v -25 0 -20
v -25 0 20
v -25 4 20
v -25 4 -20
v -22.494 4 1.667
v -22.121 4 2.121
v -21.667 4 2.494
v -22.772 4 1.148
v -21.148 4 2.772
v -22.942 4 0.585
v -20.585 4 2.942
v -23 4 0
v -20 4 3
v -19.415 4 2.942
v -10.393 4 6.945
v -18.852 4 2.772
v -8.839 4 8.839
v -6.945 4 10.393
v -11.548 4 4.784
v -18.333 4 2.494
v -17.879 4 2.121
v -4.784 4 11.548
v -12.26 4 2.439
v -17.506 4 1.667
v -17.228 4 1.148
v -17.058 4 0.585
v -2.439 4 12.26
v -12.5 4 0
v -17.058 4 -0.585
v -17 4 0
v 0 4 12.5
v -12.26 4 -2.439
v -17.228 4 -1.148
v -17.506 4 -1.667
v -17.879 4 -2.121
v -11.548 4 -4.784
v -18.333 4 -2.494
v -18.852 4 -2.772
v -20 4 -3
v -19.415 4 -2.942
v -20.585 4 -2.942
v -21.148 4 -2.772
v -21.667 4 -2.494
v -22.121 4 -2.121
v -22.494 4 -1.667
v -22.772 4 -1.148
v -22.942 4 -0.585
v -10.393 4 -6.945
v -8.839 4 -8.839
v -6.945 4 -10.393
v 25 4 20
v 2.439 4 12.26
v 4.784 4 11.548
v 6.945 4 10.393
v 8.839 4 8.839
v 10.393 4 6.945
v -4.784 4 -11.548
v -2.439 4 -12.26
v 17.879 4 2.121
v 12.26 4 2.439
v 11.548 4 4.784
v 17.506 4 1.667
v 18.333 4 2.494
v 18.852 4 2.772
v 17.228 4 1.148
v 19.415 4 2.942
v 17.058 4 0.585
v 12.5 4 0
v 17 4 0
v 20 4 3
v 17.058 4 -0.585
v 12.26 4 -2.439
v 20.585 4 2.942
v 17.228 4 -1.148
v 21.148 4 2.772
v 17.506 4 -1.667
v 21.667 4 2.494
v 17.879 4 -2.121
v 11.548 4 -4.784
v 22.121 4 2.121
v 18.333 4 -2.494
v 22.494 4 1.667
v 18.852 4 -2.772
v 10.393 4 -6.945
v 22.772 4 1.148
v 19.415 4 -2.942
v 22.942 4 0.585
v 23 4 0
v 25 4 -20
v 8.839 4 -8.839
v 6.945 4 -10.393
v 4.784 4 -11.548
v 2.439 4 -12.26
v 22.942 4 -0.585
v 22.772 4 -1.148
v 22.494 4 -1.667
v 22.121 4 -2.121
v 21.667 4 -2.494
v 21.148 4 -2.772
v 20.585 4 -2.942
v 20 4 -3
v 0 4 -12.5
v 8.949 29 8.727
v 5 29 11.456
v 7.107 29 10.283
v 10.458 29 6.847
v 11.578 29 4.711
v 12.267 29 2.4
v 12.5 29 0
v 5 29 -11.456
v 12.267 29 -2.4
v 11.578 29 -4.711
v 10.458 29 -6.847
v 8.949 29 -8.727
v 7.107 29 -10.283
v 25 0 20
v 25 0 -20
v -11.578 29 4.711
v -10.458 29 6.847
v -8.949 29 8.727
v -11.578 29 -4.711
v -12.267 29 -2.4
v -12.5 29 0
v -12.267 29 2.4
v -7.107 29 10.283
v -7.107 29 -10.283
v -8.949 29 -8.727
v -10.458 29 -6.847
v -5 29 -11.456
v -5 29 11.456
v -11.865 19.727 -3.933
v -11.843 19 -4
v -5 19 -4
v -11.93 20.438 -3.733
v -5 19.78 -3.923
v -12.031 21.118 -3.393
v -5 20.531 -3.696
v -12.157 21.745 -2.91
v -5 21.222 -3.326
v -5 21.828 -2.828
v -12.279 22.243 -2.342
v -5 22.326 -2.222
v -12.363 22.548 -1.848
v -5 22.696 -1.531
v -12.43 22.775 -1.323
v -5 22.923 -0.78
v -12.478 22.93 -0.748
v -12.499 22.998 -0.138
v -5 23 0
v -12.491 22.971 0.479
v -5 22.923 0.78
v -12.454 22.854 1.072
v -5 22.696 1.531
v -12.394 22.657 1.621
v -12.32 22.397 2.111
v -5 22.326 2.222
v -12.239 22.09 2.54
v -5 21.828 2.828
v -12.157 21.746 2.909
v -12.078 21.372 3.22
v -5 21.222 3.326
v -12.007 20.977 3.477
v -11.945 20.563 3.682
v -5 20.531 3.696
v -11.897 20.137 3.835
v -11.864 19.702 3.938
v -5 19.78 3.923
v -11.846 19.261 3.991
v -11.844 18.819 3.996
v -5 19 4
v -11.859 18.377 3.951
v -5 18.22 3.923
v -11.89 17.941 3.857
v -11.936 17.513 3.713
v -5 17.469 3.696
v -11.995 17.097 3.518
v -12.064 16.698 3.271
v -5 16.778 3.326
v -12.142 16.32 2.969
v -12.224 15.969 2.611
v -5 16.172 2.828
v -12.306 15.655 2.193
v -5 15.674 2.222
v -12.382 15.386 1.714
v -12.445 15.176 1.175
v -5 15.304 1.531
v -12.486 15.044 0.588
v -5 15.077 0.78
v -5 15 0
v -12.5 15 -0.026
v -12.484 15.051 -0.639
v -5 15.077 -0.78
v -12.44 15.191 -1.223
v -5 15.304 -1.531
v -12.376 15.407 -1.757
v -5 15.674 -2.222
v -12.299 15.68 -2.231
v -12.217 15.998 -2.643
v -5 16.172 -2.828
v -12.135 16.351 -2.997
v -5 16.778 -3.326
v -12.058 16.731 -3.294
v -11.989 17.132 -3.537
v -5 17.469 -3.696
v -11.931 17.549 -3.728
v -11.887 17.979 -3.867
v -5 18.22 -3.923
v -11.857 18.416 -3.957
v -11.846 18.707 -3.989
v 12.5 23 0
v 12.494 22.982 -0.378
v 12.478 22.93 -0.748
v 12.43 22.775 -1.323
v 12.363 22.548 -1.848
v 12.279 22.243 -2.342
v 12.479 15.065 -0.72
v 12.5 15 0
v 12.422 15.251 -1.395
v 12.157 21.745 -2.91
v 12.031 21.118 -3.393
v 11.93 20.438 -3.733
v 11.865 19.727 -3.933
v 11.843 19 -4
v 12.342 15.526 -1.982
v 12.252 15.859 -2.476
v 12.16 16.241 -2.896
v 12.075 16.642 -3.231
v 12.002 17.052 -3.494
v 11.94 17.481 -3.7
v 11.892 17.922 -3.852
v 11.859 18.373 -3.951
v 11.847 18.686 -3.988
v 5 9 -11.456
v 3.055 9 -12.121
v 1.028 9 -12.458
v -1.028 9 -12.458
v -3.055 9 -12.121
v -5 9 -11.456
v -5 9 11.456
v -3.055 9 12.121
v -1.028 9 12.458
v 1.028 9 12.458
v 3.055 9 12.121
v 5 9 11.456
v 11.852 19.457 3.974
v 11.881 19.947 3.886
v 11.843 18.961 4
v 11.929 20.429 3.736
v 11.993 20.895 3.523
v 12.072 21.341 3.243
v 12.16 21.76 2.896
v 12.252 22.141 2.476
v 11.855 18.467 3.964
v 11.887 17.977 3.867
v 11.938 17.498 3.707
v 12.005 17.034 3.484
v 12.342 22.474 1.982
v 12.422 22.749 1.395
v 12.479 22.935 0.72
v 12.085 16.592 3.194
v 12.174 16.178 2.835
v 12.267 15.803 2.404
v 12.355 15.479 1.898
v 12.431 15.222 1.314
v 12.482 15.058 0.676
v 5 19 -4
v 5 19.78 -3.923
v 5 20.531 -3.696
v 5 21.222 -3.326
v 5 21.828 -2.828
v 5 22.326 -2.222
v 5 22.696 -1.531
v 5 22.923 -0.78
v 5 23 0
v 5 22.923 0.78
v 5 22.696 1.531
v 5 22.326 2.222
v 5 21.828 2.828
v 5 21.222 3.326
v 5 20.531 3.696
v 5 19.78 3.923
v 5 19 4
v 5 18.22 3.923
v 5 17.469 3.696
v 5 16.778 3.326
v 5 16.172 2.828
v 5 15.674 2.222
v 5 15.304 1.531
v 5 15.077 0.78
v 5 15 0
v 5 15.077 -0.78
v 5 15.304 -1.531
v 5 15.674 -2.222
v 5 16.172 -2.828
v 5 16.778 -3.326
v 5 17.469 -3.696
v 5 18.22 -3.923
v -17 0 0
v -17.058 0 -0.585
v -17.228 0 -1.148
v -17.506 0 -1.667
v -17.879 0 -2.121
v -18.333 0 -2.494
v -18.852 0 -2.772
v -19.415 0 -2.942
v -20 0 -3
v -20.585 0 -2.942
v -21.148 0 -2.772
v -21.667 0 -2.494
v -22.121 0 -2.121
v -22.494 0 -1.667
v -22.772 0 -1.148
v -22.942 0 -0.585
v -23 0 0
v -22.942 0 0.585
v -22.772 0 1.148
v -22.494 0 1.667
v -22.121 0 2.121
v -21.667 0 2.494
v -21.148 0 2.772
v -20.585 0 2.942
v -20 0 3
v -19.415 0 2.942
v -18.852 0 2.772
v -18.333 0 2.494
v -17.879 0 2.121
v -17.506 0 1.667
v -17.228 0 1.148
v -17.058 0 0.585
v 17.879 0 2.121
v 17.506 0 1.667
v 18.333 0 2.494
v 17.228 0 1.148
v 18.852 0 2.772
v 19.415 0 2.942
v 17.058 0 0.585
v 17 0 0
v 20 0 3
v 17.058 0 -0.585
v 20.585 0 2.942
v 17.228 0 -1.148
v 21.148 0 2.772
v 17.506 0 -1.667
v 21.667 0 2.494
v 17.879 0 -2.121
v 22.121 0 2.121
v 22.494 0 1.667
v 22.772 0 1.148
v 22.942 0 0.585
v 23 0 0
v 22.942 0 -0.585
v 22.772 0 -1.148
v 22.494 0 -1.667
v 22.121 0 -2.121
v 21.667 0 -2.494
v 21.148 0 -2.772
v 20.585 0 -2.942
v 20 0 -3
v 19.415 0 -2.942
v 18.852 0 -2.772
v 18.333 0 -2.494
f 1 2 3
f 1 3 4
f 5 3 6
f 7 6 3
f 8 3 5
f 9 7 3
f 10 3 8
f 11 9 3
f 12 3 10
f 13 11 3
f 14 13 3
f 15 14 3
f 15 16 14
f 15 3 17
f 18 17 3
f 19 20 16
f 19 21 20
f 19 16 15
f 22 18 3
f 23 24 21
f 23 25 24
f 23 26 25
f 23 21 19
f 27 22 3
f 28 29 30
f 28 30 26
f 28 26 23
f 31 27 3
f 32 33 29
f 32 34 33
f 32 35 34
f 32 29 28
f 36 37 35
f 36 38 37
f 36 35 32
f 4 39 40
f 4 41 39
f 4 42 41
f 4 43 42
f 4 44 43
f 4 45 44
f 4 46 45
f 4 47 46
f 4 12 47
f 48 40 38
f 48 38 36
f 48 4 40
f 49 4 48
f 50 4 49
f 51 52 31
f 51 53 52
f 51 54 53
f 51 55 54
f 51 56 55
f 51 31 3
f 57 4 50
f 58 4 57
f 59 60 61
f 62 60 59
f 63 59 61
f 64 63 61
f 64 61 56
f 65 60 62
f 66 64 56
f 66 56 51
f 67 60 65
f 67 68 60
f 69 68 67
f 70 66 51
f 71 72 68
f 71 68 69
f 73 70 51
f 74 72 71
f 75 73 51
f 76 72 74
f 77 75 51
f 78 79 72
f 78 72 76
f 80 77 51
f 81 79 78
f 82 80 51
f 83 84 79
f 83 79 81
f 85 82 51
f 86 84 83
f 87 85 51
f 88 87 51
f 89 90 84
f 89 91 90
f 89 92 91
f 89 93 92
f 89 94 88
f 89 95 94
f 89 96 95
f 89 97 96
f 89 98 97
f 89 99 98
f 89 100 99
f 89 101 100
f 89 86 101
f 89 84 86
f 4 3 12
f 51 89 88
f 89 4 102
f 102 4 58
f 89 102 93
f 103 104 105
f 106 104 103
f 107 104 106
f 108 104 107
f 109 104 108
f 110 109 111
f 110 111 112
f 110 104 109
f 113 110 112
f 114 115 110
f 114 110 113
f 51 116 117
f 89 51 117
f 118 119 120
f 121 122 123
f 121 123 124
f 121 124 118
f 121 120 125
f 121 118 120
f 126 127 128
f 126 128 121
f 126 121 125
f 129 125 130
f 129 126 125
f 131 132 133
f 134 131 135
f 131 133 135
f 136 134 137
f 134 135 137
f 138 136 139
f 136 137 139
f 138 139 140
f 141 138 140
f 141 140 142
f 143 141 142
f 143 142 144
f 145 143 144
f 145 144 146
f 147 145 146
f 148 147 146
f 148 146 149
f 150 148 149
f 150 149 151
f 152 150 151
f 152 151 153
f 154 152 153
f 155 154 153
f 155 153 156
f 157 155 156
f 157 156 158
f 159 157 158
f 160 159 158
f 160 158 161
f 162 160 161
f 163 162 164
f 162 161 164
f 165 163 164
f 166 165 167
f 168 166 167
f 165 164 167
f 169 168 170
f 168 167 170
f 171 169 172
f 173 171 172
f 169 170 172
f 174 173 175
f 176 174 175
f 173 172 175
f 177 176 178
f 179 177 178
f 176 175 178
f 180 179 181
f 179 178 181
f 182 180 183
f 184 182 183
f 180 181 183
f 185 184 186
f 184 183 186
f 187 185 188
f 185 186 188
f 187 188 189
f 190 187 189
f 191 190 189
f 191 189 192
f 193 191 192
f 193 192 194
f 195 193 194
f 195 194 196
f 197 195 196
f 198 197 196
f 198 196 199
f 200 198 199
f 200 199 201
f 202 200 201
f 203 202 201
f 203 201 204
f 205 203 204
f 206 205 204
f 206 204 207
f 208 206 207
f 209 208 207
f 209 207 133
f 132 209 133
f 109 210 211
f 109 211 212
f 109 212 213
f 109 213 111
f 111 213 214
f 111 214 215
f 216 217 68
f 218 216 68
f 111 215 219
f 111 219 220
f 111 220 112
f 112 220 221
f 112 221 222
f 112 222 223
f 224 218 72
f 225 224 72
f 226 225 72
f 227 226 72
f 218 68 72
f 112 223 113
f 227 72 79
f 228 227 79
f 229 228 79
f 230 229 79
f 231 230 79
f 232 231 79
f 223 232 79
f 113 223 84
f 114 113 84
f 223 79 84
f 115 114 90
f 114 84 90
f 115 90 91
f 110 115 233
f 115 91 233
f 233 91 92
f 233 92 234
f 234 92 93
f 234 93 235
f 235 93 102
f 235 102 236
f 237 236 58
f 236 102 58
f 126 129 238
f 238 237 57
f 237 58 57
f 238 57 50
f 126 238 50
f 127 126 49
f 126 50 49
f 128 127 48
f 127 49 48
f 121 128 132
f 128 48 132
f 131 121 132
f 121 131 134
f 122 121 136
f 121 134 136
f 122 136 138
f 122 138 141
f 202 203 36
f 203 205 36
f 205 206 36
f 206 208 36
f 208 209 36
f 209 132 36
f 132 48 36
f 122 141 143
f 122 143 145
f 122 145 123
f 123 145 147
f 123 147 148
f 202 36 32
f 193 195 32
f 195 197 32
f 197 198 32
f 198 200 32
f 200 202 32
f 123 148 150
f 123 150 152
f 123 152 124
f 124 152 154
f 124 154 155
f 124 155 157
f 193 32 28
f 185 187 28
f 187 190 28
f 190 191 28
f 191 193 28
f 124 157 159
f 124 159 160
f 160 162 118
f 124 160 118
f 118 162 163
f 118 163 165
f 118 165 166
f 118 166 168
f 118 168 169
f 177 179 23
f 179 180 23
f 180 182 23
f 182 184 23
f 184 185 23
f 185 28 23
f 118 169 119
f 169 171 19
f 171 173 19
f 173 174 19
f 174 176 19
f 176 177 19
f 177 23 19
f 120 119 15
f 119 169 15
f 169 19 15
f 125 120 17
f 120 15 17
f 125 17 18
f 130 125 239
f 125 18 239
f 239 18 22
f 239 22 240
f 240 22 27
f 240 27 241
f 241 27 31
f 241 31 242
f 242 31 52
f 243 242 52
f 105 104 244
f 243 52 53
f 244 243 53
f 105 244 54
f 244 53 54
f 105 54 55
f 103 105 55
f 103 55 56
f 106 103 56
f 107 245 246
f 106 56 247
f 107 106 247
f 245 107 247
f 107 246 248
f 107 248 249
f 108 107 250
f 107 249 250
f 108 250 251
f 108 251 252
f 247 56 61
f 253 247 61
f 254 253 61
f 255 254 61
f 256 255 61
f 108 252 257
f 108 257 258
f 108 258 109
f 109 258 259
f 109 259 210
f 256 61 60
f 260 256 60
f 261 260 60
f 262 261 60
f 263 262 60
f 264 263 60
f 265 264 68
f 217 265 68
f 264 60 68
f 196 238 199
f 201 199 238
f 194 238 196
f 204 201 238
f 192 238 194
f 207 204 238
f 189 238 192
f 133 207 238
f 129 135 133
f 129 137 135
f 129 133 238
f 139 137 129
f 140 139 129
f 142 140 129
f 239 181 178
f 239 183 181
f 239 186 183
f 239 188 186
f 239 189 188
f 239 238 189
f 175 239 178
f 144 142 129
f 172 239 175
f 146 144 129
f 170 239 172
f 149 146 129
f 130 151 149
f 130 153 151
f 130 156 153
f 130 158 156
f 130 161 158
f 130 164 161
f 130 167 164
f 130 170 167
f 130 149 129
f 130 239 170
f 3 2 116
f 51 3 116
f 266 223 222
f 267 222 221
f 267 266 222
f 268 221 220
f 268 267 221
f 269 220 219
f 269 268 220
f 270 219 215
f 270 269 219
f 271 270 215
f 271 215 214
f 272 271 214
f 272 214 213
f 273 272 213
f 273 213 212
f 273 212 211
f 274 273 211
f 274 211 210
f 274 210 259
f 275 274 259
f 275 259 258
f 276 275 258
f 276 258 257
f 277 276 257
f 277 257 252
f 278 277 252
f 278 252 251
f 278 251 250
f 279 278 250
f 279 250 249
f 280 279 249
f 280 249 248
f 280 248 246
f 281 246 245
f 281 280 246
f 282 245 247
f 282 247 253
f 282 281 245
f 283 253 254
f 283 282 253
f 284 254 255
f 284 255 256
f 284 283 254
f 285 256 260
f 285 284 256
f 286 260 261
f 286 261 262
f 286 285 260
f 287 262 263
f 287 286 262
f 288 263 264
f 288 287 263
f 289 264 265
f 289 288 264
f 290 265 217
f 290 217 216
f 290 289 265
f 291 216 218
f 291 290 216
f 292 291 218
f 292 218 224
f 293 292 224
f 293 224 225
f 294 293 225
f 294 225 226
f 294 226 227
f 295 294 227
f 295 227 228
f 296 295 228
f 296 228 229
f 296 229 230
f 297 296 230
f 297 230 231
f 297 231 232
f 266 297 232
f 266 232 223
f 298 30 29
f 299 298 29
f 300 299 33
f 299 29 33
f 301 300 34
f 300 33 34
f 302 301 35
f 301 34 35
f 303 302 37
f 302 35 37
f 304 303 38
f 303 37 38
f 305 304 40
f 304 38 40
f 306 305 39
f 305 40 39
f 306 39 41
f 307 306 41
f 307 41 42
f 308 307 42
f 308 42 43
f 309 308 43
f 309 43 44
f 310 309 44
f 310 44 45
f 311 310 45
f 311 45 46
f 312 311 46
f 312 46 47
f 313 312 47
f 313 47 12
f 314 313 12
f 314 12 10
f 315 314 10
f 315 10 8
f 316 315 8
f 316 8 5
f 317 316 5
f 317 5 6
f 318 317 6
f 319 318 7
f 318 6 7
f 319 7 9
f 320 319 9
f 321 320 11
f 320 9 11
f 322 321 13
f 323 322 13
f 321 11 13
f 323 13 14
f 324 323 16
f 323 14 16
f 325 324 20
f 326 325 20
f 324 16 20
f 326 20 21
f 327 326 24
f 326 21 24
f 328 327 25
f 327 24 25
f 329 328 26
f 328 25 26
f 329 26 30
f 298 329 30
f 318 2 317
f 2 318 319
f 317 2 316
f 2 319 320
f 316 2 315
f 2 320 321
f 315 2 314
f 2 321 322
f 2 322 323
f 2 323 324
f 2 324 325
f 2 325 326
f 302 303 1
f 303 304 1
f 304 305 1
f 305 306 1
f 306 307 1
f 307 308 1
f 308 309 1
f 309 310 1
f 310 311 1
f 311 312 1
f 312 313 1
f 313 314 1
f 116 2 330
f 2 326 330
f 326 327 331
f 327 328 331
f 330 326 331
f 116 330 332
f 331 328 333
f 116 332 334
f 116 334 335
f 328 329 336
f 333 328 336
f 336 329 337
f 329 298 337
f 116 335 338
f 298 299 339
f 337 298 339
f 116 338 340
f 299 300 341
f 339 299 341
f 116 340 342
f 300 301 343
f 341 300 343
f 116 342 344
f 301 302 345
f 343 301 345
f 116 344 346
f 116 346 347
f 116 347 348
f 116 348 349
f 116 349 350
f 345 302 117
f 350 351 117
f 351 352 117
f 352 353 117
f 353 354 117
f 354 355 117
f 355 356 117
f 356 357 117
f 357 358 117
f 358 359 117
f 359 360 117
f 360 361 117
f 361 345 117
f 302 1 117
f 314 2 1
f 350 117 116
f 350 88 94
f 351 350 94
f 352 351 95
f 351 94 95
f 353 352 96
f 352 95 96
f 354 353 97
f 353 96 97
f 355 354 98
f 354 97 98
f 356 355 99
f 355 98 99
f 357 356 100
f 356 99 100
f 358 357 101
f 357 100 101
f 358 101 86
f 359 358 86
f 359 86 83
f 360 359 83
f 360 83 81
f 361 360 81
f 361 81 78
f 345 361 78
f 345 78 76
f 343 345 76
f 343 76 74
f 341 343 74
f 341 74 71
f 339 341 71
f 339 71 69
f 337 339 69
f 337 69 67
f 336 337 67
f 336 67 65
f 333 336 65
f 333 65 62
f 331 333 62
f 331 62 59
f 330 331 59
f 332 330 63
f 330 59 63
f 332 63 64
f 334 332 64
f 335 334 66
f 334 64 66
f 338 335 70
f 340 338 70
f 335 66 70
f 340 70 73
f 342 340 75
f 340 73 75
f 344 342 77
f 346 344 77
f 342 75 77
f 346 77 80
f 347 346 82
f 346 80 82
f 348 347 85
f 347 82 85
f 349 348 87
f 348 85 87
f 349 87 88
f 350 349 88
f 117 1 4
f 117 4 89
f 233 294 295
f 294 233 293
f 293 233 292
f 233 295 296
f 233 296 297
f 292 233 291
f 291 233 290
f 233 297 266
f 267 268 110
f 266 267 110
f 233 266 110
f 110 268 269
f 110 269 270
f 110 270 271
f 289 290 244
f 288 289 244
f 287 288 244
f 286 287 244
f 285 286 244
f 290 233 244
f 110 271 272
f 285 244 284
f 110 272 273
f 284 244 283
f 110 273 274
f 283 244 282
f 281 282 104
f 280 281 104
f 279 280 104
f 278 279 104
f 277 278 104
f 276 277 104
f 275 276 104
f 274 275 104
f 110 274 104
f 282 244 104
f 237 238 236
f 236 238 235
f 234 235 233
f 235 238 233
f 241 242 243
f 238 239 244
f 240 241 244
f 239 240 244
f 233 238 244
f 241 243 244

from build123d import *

# Parameters (mm, degrees)
SKETCH_1_W               = 50
SKETCH_1_H               = 40
EXTRUDE_1_DEPTH          = 4
SKETCH_2_R               = 12.5
EXTRUDE_2_DEPTH          = 25
SKETCH_3_W               = 10
SKETCH_3_H               = 20
CUT_EXTRUDE_1_DEPTH      = 20
SKETCH_4_R               = 4
CUT_EXTRUDE_2_DEPTH      = 26
CUT_EXTRUDE_2_DEPTH_BACK = 26
SKETCH_5_R               = 3
CUT_EXTRUDE_3_DEPTH      = 10


with BuildPart() as part:
    # 草图1 → 凸台-拉伸1 (new body)
    with BuildSketch(Plane(origin=(0, 0, 0), x_dir=(1, 0, 0), z_dir=(0, 1, 0))):
        Rectangle(SKETCH_1_W, SKETCH_1_H)
    extrude(amount=EXTRUDE_1_DEPTH)

    # 草图2 → 凸台-拉伸2 (add)
    with BuildSketch(Plane(origin=(0, 4, 0), x_dir=(1, 0, 0), z_dir=(0, 1, 0))):
        Circle(SKETCH_2_R)
    extrude(amount=EXTRUDE_2_DEPTH)

    # 草图3 → 切除-拉伸1 (cut, symmetric)
    with BuildSketch(Plane.XY):
        with Locations((0, 19)):
            Rectangle(SKETCH_3_W, SKETCH_3_H)
    extrude(amount=CUT_EXTRUDE_1_DEPTH, both=True, mode=Mode.SUBTRACT)

    # 草图4 → 切除-拉伸2 (cut, two sides)
    with BuildSketch(Plane(origin=(0, 0, 0), x_dir=(0, 0, -1), z_dir=(1, 0, 0))) as cut_extrude_2_sk:
        with Locations((0, 19)):
            Circle(SKETCH_4_R)
    extrude(amount=CUT_EXTRUDE_2_DEPTH, mode=Mode.SUBTRACT)
    extrude(cut_extrude_2_sk.sketch, amount=-CUT_EXTRUDE_2_DEPTH_BACK, mode=Mode.SUBTRACT)

    # 草图5 → 切除-拉伸3 (cut)
    with BuildSketch(Plane(origin=(0, 4, 0), x_dir=(1, 0, 0), z_dir=(0, 1, 0))):
        with Locations((-20, 0)):
            Circle(SKETCH_5_R)
        with Locations((20, 0)):
            Circle(SKETCH_5_R)
    extrude(amount=-CUT_EXTRUDE_3_DEPTH, mode=Mode.SUBTRACT)


solid = part.part
